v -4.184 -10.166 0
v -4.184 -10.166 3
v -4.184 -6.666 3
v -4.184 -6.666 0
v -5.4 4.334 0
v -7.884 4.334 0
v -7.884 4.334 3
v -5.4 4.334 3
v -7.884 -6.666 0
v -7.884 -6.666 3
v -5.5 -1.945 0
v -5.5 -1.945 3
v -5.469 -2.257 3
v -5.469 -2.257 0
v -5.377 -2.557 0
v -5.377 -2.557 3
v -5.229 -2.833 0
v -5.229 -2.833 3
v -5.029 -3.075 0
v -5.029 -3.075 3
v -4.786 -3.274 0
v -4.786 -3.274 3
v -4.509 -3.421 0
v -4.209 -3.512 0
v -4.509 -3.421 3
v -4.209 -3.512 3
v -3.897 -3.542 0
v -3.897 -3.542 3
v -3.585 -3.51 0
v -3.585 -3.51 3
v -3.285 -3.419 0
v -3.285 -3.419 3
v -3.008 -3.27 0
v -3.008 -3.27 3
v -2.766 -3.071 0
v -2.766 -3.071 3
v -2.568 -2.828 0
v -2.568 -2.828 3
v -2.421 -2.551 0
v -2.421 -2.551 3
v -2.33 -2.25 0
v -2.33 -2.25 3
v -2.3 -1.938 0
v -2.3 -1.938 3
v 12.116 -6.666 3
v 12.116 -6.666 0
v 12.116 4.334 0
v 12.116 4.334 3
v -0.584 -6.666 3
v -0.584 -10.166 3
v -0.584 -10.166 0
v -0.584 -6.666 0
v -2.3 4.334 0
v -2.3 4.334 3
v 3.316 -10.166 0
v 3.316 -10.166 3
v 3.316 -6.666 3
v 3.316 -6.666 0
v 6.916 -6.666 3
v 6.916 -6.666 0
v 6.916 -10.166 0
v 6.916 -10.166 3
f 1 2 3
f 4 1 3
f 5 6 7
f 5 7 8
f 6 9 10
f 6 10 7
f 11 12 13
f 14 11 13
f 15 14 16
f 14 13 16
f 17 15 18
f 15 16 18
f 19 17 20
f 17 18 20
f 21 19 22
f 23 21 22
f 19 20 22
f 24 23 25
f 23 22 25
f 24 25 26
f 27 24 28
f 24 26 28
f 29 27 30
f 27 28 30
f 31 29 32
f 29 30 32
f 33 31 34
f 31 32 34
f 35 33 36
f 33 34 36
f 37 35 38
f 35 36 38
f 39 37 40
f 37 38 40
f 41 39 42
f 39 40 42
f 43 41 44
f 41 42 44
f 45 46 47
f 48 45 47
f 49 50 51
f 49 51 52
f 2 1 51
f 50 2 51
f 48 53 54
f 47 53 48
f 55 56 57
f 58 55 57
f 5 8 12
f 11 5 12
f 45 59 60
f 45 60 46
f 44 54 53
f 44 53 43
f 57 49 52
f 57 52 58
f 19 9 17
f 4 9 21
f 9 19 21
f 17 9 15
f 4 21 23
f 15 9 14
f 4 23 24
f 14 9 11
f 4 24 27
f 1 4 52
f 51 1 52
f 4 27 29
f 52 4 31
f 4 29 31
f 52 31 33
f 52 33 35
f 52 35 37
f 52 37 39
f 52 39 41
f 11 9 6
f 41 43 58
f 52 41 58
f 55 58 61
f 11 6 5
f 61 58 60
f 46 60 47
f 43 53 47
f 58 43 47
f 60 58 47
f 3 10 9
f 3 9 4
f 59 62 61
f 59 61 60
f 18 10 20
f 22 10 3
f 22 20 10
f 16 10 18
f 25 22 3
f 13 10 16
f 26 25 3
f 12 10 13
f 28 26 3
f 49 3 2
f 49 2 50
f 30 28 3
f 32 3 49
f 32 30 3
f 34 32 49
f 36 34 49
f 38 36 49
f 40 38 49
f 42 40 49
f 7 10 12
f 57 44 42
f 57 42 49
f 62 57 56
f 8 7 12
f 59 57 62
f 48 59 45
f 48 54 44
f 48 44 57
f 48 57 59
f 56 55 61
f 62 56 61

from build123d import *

# Parameters (mm, degrees)
SKETCH1_W           = 20
SKETCH1_H           = 14.5
BOSS_EXTRUDE1_DEPTH = 3
SKETCH2_W           = 3.7
SKETCH2_H           = 3.5
SKETCH2_W_2         = 3.9
SKETCH2_W_3         = 5.2
CUT_EXTRUDE1_DEPTH  = 3
CUT_EXTRUDE2_DEPTH  = 3
CUT_EXTRUDE3_DEPTH  = 3


with BuildPart() as part:
    # Sketch1 → Boss-Extrude1 (new body)
    with BuildSketch(Plane.XY):
        with Locations((2.116182573, -2.915975104)):
            Rectangle(SKETCH1_W, SKETCH1_H)
    extrude(amount=BOSS_EXTRUDE1_DEPTH)

    # Sketch2 → Cut-Extrude1 (cut)
    with BuildSketch(Plane.XY.offset(3)):
        with Locations((-6.033817427, -8.415975104)):
            Rectangle(SKETCH2_W, SKETCH2_H)
        with Locations((1.366182573, -8.415975104)):
            Rectangle(SKETCH2_W_2, SKETCH2_H)
        with Locations((9.516182573, -8.415975104)):
            Rectangle(SKETCH2_W_3, SKETCH2_H)
    extrude(amount=-CUT_EXTRUDE1_DEPTH, mode=Mode.SUBTRACT)

    # Sketch3 → Cut-Extrude2 (cut)
    with BuildSketch(Plane.XY.offset(3)):
        with BuildLine():
            Line((-2.300101836, 4.334024896), (-2.300101836, -1.938179145))
            ThreePointArc((-2.300101836, -1.938179145), (-3.850101836, -3.488179145), (-5.400101836, -1.938179145))
            Line((-5.400101836, -1.938179145), (-5.400101836, 4.334024896))
            ThreePointArc((-5.400101836, 4.334024896), (-3.850101836, 5.884024896), (-2.300101836, 4.334024896))
        make_face()
    extrude(amount=-CUT_EXTRUDE2_DEPTH, mode=Mode.SUBTRACT)

    # Sketch4 → Cut-Extrude3 (cut)
    with BuildSketch(Plane.XY.offset(3)):
        with BuildLine():
            Line((-5.400101836, 4.334024896), (-5.500101836, -1.945141671))
            ThreePointArc((-5.500101836, -1.945141671), (-3.896620573, -3.541660408), (-2.300101836, -1.938179145))
            Line((-2.300101836, -1.938179145), (-5.400101836, 4.334024896))
        make_face()
    extrude(amount=-CUT_EXTRUDE3_DEPTH, mode=Mode.SUBTRACT)


solid = part.part
